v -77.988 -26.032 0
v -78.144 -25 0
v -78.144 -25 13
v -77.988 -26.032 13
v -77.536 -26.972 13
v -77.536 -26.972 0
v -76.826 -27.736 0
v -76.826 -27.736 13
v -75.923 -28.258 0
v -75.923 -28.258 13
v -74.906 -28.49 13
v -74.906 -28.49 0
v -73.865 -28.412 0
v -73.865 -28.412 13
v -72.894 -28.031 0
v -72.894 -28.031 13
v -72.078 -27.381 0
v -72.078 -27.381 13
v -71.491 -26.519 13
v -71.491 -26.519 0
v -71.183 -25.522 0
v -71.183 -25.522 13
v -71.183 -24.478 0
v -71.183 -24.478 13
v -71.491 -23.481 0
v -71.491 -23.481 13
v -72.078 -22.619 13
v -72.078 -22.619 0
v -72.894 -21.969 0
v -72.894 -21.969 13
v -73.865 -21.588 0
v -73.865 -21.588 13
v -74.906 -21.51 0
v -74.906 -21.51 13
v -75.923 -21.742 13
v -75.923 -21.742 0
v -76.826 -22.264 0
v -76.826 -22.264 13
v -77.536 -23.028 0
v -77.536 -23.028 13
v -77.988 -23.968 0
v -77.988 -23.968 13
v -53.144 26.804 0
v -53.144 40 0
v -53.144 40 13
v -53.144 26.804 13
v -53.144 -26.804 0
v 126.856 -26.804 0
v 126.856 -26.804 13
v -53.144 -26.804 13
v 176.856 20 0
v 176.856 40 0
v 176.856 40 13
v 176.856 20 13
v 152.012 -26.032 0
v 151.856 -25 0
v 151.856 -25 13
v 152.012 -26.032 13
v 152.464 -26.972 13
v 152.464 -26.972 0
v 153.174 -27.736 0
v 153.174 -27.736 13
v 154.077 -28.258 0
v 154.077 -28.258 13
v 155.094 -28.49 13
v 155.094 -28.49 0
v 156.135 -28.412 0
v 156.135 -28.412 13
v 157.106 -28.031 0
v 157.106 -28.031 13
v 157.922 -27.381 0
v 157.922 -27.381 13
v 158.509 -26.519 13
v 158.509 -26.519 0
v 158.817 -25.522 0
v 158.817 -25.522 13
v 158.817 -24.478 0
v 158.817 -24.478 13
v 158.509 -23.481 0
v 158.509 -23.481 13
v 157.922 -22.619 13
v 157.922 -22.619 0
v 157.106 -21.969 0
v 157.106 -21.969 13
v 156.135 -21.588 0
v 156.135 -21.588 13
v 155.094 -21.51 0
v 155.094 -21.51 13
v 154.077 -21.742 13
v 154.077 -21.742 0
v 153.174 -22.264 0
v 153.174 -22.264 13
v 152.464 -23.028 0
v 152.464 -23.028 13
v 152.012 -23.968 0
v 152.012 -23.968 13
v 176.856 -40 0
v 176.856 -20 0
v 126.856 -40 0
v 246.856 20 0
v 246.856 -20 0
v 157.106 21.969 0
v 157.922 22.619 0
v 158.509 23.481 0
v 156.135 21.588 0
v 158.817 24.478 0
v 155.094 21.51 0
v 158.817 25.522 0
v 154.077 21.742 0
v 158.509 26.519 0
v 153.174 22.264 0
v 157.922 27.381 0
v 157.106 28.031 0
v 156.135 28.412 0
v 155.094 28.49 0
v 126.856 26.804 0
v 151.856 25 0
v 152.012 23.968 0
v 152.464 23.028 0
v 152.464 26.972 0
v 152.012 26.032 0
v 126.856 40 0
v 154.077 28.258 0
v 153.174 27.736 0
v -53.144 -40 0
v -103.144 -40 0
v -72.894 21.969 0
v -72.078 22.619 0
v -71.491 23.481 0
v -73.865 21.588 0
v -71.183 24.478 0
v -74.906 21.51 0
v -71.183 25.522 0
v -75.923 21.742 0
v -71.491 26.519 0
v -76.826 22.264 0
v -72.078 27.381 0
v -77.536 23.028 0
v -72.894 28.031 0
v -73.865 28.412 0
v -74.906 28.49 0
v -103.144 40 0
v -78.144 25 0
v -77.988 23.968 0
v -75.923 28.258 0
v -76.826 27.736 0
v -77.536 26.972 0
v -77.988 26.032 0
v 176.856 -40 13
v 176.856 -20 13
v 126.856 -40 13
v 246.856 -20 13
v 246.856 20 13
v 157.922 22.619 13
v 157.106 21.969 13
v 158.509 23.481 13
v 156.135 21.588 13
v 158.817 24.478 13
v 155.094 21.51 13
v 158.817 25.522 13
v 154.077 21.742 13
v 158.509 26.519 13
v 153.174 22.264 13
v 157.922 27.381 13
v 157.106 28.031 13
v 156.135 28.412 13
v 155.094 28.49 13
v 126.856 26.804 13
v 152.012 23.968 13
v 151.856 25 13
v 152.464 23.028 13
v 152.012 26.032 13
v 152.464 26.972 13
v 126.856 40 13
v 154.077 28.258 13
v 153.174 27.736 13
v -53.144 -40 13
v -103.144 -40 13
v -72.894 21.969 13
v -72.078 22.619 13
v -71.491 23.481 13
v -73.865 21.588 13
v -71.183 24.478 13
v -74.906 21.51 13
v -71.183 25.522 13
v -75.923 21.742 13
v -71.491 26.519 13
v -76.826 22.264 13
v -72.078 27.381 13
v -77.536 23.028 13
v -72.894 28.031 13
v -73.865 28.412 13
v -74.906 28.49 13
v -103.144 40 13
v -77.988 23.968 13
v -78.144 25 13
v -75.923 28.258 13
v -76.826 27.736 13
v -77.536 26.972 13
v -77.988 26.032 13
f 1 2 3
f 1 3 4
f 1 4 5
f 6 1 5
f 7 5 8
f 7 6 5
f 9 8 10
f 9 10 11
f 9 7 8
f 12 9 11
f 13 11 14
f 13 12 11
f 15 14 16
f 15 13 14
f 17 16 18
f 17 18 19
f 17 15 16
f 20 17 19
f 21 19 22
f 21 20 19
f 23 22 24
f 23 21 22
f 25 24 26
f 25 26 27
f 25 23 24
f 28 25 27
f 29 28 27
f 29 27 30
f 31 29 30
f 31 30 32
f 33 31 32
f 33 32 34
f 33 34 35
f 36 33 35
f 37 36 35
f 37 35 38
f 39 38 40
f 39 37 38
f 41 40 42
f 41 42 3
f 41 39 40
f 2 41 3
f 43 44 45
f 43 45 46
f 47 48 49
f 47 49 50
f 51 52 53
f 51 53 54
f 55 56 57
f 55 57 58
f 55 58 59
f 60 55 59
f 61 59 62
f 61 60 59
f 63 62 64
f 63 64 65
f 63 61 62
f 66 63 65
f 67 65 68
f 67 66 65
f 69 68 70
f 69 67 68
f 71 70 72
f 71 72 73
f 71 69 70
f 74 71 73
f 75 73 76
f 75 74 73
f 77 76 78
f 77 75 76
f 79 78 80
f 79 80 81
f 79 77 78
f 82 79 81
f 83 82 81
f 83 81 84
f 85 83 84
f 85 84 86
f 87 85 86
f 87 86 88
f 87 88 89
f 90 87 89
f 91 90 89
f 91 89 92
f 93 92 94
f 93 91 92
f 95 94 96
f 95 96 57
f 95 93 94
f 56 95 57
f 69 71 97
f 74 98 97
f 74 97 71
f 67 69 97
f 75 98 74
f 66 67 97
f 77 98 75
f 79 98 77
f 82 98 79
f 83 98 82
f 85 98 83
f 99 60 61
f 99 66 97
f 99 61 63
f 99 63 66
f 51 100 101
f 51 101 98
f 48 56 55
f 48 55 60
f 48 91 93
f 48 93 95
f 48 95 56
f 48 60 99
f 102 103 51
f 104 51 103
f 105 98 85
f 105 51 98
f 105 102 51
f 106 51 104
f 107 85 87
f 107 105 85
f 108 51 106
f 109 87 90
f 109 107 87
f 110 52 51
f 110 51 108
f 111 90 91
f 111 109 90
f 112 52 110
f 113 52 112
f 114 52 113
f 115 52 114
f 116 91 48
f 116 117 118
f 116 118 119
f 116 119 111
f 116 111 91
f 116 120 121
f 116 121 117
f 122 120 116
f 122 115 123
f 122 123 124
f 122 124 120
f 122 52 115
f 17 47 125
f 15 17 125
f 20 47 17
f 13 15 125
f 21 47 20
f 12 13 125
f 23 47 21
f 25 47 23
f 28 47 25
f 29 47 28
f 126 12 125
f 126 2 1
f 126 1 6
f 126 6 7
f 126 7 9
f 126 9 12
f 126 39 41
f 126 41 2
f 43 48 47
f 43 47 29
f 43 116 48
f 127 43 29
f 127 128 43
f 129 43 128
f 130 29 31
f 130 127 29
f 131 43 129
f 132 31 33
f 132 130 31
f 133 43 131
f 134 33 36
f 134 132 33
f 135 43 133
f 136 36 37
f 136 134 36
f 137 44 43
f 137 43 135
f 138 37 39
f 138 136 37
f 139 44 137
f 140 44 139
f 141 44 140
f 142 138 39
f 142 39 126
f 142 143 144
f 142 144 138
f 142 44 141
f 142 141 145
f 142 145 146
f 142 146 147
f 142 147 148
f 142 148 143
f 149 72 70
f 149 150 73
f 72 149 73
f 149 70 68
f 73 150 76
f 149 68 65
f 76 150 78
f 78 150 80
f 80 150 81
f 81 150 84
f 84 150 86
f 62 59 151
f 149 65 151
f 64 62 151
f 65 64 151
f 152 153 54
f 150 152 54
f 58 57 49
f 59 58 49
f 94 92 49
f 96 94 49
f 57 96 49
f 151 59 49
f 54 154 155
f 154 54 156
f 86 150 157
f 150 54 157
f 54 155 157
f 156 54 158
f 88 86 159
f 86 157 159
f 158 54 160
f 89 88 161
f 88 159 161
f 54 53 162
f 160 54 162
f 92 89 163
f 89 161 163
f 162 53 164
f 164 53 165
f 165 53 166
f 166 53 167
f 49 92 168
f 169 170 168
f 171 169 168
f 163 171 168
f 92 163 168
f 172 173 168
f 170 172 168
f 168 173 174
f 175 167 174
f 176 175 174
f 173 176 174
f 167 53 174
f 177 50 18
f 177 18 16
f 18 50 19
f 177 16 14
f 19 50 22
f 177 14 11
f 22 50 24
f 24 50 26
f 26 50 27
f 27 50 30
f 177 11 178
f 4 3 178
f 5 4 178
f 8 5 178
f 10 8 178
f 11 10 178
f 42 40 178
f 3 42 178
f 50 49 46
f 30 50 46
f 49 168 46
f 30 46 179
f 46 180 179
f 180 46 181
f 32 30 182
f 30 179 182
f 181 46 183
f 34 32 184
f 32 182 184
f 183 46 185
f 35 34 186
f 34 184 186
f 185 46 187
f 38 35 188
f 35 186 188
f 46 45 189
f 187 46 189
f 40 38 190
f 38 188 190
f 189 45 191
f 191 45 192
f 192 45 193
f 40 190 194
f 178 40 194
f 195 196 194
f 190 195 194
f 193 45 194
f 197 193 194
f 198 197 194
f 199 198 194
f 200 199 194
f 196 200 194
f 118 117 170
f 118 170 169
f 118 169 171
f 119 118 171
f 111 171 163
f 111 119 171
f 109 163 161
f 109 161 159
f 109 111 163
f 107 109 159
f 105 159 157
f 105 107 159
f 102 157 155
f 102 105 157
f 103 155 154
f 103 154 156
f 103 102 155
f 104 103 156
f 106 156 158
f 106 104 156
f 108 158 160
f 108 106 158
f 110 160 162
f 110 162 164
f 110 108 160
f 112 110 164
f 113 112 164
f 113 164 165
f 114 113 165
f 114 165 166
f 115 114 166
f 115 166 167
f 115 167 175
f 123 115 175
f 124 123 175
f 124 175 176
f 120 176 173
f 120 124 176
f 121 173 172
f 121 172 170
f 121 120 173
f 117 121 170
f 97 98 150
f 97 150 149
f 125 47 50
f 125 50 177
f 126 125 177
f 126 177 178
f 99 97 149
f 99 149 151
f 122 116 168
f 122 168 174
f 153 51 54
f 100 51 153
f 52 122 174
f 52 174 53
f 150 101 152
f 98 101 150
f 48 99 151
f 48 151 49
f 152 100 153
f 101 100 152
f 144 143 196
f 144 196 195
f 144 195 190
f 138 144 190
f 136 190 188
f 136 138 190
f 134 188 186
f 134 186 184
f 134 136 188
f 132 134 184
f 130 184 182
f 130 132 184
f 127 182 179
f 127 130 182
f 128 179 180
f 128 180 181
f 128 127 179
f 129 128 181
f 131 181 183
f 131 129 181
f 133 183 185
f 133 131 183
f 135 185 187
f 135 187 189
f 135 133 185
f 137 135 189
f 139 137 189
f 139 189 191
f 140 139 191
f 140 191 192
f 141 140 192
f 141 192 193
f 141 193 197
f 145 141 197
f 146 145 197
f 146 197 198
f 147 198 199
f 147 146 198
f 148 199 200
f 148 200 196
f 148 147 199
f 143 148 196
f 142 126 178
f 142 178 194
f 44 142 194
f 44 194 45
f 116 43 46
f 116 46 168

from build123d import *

# Parameters (mm, degrees)
SKETCH1_R           = 3.5
BOSS_EXTRUDE1_DEPTH = 13


with BuildPart() as part:
    # Sketch1 → Boss-Extrude1 (new body)
    with BuildSketch(Plane.XY):
        Polygon((-103.143983002, -40), (-103.143983002, 40), (-53.143983002, 40), (-53.143983002, 26.804123711), (126.856016998, 26.804123711), (126.856016998, 40), (176.856016998, 40), (176.856016998, 20), (246.856016998, 20), (246.856016998, -20), (176.856016998, -20), (176.856016998, -40), (126.856016998, -40), (126.856016998, -26.804123711), (-53.143983002, -26.804123711), (-53.143983002, -40), align=None)
        with Locations(Location((-74.643983002, 25, 0), (0, 0, 180))):
            Circle(SKETCH1_R, mode=Mode.SUBTRACT)
        with Locations(Location((155.356016998, 25, 0), (0, 0, 180))):
            Circle(SKETCH1_R, mode=Mode.SUBTRACT)
        with Locations(Location((155.356016998, -25, 0), (0, 0, 180))):
            Circle(SKETCH1_R, mode=Mode.SUBTRACT)
        with Locations(Location((-74.643983002, -25, 0), (0, 0, 180))):
            Circle(SKETCH1_R, mode=Mode.SUBTRACT)
    extrude(amount=BOSS_EXTRUDE1_DEPTH)


solid = part.part
